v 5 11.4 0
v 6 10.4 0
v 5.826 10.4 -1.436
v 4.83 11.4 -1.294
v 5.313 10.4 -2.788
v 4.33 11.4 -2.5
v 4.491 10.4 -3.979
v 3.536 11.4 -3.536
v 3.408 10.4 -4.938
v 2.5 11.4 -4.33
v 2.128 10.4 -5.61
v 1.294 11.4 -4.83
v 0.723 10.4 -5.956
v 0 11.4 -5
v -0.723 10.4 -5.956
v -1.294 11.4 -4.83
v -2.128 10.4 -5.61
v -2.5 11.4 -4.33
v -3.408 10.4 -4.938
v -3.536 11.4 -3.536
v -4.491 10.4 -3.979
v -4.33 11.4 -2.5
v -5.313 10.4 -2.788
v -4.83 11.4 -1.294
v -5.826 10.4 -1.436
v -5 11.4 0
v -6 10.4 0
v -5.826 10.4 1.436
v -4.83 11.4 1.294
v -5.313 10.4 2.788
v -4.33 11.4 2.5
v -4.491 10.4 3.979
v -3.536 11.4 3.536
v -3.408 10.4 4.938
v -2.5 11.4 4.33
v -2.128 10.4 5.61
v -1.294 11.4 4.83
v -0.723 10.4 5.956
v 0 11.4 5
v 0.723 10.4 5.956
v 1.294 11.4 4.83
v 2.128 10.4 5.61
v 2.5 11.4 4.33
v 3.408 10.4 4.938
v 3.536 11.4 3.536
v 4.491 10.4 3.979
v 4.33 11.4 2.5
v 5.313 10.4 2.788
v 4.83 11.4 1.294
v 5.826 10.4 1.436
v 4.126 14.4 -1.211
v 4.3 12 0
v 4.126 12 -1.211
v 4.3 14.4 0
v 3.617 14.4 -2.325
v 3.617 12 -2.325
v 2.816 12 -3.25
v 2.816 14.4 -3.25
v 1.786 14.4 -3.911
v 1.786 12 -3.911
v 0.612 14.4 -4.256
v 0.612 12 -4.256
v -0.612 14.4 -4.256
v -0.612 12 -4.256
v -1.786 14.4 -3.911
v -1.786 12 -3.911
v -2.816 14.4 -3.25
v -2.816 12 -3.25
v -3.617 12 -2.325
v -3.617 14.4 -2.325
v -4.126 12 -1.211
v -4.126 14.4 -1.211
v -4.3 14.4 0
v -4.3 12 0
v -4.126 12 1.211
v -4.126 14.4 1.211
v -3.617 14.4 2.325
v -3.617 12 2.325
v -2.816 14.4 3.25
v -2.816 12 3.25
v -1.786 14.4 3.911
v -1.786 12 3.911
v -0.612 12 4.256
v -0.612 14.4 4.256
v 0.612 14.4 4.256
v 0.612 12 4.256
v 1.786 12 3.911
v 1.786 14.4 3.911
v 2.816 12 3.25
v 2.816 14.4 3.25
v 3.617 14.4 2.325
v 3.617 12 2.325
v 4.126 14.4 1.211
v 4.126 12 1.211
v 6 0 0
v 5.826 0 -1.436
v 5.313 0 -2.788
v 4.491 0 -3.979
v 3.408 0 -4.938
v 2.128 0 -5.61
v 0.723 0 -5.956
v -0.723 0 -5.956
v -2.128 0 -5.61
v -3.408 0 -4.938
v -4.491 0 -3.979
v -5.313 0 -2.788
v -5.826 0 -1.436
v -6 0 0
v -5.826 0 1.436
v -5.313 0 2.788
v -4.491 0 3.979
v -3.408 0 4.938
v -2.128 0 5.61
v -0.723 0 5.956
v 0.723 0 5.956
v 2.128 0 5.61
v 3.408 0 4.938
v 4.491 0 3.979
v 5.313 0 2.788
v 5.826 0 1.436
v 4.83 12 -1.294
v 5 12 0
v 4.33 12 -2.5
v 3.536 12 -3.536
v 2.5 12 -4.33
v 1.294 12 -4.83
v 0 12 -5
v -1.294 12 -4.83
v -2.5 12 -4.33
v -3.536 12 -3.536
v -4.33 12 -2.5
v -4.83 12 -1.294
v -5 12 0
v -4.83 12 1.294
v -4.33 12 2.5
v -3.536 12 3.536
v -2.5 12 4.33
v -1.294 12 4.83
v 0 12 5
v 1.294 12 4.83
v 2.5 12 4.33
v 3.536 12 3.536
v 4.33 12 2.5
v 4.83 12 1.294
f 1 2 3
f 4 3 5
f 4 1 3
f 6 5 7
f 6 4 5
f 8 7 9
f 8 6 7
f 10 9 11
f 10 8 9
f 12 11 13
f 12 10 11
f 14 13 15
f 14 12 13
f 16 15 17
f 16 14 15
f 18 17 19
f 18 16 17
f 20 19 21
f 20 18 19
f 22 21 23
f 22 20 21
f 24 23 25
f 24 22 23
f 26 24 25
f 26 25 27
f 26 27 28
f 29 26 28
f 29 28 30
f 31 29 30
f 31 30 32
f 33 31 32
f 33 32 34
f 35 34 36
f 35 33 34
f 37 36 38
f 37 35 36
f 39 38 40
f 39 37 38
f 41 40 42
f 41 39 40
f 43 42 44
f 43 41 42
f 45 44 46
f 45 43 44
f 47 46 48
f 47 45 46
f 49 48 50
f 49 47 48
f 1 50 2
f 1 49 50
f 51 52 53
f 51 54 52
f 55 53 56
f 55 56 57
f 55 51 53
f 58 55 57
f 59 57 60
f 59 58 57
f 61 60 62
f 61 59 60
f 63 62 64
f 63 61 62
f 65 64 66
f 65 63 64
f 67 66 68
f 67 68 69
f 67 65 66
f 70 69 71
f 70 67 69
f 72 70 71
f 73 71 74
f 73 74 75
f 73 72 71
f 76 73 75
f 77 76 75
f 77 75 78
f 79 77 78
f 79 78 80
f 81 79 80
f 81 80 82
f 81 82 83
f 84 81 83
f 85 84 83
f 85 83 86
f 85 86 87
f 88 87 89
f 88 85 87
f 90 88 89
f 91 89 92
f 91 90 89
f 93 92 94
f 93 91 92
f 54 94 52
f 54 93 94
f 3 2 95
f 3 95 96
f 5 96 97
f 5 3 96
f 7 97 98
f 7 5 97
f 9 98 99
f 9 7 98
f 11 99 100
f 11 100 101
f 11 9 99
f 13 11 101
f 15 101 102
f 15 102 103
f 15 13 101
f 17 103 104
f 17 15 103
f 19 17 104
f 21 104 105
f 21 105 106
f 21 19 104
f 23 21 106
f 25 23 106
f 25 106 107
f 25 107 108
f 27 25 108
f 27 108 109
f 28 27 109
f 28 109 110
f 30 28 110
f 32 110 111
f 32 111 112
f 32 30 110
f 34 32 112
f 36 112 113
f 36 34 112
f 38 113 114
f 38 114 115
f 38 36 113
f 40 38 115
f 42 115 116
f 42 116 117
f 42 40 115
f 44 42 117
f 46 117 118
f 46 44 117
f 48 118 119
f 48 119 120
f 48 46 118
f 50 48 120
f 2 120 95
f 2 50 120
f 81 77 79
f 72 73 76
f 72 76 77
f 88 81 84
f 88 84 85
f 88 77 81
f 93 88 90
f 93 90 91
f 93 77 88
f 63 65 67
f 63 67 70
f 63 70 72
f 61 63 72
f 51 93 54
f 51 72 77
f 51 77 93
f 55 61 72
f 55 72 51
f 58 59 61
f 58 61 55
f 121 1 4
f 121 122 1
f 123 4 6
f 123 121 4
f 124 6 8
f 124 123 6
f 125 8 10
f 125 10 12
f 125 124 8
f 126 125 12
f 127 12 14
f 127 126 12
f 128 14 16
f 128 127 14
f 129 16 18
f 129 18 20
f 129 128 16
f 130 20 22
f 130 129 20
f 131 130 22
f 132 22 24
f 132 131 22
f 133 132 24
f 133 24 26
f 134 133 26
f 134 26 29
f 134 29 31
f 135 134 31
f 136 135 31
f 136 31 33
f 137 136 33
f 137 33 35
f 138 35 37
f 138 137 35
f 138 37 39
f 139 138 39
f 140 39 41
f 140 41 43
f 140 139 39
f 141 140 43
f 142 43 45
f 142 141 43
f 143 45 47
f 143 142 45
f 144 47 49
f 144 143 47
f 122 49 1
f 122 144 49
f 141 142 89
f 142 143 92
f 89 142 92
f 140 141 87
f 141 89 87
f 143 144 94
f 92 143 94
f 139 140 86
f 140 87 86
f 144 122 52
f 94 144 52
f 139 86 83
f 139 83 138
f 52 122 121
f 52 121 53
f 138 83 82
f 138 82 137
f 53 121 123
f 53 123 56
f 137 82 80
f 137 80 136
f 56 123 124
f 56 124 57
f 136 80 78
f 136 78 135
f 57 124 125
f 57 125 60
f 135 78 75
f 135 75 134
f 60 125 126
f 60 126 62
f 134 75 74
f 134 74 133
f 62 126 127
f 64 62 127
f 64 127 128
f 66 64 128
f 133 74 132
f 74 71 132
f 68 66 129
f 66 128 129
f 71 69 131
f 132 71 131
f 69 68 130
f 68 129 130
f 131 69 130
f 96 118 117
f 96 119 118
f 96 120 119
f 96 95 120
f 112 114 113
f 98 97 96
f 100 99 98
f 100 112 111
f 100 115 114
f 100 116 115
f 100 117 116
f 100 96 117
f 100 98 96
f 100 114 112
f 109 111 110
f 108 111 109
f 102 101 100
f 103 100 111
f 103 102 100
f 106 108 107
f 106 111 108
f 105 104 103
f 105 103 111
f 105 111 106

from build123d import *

# Parameters (mm, degrees)
F0_W    = 0.7
F0_H    = 0.6
F2_SIZE = 0.99999


# Not quite as in the source:
# - a fillet or chamfer is up to 0.001 mm smaller than in the source, because OpenCascade refuses the exact size


with BuildPart() as f1:
    # F0 (on Top) → F1 (revolve)
    with BuildSketch(Plane.XY):
        with Locations((4.65, 11.7)):
            Rectangle(F0_W, F0_H)
        Polygon((0, 14.4), (0, 0), (6, 0), (6, 11.4), (5, 11.4), (4.3, 11.4), (4.3, 12), (4.3, 14.4), align=None)
    revolve(axis=Axis((0, 7.2, 0), (0, 1, 0)))

    # F2 (size 1 in the source; OpenCascade refuses exactly that, so slightly less here)
    f2_edges = [f1.edges().sort_by_distance(p)[0] for p in [
        (-6, 11.4, 0),
    ]]
    chamfer(f2_edges, length=F2_SIZE)


solid = f1.part
